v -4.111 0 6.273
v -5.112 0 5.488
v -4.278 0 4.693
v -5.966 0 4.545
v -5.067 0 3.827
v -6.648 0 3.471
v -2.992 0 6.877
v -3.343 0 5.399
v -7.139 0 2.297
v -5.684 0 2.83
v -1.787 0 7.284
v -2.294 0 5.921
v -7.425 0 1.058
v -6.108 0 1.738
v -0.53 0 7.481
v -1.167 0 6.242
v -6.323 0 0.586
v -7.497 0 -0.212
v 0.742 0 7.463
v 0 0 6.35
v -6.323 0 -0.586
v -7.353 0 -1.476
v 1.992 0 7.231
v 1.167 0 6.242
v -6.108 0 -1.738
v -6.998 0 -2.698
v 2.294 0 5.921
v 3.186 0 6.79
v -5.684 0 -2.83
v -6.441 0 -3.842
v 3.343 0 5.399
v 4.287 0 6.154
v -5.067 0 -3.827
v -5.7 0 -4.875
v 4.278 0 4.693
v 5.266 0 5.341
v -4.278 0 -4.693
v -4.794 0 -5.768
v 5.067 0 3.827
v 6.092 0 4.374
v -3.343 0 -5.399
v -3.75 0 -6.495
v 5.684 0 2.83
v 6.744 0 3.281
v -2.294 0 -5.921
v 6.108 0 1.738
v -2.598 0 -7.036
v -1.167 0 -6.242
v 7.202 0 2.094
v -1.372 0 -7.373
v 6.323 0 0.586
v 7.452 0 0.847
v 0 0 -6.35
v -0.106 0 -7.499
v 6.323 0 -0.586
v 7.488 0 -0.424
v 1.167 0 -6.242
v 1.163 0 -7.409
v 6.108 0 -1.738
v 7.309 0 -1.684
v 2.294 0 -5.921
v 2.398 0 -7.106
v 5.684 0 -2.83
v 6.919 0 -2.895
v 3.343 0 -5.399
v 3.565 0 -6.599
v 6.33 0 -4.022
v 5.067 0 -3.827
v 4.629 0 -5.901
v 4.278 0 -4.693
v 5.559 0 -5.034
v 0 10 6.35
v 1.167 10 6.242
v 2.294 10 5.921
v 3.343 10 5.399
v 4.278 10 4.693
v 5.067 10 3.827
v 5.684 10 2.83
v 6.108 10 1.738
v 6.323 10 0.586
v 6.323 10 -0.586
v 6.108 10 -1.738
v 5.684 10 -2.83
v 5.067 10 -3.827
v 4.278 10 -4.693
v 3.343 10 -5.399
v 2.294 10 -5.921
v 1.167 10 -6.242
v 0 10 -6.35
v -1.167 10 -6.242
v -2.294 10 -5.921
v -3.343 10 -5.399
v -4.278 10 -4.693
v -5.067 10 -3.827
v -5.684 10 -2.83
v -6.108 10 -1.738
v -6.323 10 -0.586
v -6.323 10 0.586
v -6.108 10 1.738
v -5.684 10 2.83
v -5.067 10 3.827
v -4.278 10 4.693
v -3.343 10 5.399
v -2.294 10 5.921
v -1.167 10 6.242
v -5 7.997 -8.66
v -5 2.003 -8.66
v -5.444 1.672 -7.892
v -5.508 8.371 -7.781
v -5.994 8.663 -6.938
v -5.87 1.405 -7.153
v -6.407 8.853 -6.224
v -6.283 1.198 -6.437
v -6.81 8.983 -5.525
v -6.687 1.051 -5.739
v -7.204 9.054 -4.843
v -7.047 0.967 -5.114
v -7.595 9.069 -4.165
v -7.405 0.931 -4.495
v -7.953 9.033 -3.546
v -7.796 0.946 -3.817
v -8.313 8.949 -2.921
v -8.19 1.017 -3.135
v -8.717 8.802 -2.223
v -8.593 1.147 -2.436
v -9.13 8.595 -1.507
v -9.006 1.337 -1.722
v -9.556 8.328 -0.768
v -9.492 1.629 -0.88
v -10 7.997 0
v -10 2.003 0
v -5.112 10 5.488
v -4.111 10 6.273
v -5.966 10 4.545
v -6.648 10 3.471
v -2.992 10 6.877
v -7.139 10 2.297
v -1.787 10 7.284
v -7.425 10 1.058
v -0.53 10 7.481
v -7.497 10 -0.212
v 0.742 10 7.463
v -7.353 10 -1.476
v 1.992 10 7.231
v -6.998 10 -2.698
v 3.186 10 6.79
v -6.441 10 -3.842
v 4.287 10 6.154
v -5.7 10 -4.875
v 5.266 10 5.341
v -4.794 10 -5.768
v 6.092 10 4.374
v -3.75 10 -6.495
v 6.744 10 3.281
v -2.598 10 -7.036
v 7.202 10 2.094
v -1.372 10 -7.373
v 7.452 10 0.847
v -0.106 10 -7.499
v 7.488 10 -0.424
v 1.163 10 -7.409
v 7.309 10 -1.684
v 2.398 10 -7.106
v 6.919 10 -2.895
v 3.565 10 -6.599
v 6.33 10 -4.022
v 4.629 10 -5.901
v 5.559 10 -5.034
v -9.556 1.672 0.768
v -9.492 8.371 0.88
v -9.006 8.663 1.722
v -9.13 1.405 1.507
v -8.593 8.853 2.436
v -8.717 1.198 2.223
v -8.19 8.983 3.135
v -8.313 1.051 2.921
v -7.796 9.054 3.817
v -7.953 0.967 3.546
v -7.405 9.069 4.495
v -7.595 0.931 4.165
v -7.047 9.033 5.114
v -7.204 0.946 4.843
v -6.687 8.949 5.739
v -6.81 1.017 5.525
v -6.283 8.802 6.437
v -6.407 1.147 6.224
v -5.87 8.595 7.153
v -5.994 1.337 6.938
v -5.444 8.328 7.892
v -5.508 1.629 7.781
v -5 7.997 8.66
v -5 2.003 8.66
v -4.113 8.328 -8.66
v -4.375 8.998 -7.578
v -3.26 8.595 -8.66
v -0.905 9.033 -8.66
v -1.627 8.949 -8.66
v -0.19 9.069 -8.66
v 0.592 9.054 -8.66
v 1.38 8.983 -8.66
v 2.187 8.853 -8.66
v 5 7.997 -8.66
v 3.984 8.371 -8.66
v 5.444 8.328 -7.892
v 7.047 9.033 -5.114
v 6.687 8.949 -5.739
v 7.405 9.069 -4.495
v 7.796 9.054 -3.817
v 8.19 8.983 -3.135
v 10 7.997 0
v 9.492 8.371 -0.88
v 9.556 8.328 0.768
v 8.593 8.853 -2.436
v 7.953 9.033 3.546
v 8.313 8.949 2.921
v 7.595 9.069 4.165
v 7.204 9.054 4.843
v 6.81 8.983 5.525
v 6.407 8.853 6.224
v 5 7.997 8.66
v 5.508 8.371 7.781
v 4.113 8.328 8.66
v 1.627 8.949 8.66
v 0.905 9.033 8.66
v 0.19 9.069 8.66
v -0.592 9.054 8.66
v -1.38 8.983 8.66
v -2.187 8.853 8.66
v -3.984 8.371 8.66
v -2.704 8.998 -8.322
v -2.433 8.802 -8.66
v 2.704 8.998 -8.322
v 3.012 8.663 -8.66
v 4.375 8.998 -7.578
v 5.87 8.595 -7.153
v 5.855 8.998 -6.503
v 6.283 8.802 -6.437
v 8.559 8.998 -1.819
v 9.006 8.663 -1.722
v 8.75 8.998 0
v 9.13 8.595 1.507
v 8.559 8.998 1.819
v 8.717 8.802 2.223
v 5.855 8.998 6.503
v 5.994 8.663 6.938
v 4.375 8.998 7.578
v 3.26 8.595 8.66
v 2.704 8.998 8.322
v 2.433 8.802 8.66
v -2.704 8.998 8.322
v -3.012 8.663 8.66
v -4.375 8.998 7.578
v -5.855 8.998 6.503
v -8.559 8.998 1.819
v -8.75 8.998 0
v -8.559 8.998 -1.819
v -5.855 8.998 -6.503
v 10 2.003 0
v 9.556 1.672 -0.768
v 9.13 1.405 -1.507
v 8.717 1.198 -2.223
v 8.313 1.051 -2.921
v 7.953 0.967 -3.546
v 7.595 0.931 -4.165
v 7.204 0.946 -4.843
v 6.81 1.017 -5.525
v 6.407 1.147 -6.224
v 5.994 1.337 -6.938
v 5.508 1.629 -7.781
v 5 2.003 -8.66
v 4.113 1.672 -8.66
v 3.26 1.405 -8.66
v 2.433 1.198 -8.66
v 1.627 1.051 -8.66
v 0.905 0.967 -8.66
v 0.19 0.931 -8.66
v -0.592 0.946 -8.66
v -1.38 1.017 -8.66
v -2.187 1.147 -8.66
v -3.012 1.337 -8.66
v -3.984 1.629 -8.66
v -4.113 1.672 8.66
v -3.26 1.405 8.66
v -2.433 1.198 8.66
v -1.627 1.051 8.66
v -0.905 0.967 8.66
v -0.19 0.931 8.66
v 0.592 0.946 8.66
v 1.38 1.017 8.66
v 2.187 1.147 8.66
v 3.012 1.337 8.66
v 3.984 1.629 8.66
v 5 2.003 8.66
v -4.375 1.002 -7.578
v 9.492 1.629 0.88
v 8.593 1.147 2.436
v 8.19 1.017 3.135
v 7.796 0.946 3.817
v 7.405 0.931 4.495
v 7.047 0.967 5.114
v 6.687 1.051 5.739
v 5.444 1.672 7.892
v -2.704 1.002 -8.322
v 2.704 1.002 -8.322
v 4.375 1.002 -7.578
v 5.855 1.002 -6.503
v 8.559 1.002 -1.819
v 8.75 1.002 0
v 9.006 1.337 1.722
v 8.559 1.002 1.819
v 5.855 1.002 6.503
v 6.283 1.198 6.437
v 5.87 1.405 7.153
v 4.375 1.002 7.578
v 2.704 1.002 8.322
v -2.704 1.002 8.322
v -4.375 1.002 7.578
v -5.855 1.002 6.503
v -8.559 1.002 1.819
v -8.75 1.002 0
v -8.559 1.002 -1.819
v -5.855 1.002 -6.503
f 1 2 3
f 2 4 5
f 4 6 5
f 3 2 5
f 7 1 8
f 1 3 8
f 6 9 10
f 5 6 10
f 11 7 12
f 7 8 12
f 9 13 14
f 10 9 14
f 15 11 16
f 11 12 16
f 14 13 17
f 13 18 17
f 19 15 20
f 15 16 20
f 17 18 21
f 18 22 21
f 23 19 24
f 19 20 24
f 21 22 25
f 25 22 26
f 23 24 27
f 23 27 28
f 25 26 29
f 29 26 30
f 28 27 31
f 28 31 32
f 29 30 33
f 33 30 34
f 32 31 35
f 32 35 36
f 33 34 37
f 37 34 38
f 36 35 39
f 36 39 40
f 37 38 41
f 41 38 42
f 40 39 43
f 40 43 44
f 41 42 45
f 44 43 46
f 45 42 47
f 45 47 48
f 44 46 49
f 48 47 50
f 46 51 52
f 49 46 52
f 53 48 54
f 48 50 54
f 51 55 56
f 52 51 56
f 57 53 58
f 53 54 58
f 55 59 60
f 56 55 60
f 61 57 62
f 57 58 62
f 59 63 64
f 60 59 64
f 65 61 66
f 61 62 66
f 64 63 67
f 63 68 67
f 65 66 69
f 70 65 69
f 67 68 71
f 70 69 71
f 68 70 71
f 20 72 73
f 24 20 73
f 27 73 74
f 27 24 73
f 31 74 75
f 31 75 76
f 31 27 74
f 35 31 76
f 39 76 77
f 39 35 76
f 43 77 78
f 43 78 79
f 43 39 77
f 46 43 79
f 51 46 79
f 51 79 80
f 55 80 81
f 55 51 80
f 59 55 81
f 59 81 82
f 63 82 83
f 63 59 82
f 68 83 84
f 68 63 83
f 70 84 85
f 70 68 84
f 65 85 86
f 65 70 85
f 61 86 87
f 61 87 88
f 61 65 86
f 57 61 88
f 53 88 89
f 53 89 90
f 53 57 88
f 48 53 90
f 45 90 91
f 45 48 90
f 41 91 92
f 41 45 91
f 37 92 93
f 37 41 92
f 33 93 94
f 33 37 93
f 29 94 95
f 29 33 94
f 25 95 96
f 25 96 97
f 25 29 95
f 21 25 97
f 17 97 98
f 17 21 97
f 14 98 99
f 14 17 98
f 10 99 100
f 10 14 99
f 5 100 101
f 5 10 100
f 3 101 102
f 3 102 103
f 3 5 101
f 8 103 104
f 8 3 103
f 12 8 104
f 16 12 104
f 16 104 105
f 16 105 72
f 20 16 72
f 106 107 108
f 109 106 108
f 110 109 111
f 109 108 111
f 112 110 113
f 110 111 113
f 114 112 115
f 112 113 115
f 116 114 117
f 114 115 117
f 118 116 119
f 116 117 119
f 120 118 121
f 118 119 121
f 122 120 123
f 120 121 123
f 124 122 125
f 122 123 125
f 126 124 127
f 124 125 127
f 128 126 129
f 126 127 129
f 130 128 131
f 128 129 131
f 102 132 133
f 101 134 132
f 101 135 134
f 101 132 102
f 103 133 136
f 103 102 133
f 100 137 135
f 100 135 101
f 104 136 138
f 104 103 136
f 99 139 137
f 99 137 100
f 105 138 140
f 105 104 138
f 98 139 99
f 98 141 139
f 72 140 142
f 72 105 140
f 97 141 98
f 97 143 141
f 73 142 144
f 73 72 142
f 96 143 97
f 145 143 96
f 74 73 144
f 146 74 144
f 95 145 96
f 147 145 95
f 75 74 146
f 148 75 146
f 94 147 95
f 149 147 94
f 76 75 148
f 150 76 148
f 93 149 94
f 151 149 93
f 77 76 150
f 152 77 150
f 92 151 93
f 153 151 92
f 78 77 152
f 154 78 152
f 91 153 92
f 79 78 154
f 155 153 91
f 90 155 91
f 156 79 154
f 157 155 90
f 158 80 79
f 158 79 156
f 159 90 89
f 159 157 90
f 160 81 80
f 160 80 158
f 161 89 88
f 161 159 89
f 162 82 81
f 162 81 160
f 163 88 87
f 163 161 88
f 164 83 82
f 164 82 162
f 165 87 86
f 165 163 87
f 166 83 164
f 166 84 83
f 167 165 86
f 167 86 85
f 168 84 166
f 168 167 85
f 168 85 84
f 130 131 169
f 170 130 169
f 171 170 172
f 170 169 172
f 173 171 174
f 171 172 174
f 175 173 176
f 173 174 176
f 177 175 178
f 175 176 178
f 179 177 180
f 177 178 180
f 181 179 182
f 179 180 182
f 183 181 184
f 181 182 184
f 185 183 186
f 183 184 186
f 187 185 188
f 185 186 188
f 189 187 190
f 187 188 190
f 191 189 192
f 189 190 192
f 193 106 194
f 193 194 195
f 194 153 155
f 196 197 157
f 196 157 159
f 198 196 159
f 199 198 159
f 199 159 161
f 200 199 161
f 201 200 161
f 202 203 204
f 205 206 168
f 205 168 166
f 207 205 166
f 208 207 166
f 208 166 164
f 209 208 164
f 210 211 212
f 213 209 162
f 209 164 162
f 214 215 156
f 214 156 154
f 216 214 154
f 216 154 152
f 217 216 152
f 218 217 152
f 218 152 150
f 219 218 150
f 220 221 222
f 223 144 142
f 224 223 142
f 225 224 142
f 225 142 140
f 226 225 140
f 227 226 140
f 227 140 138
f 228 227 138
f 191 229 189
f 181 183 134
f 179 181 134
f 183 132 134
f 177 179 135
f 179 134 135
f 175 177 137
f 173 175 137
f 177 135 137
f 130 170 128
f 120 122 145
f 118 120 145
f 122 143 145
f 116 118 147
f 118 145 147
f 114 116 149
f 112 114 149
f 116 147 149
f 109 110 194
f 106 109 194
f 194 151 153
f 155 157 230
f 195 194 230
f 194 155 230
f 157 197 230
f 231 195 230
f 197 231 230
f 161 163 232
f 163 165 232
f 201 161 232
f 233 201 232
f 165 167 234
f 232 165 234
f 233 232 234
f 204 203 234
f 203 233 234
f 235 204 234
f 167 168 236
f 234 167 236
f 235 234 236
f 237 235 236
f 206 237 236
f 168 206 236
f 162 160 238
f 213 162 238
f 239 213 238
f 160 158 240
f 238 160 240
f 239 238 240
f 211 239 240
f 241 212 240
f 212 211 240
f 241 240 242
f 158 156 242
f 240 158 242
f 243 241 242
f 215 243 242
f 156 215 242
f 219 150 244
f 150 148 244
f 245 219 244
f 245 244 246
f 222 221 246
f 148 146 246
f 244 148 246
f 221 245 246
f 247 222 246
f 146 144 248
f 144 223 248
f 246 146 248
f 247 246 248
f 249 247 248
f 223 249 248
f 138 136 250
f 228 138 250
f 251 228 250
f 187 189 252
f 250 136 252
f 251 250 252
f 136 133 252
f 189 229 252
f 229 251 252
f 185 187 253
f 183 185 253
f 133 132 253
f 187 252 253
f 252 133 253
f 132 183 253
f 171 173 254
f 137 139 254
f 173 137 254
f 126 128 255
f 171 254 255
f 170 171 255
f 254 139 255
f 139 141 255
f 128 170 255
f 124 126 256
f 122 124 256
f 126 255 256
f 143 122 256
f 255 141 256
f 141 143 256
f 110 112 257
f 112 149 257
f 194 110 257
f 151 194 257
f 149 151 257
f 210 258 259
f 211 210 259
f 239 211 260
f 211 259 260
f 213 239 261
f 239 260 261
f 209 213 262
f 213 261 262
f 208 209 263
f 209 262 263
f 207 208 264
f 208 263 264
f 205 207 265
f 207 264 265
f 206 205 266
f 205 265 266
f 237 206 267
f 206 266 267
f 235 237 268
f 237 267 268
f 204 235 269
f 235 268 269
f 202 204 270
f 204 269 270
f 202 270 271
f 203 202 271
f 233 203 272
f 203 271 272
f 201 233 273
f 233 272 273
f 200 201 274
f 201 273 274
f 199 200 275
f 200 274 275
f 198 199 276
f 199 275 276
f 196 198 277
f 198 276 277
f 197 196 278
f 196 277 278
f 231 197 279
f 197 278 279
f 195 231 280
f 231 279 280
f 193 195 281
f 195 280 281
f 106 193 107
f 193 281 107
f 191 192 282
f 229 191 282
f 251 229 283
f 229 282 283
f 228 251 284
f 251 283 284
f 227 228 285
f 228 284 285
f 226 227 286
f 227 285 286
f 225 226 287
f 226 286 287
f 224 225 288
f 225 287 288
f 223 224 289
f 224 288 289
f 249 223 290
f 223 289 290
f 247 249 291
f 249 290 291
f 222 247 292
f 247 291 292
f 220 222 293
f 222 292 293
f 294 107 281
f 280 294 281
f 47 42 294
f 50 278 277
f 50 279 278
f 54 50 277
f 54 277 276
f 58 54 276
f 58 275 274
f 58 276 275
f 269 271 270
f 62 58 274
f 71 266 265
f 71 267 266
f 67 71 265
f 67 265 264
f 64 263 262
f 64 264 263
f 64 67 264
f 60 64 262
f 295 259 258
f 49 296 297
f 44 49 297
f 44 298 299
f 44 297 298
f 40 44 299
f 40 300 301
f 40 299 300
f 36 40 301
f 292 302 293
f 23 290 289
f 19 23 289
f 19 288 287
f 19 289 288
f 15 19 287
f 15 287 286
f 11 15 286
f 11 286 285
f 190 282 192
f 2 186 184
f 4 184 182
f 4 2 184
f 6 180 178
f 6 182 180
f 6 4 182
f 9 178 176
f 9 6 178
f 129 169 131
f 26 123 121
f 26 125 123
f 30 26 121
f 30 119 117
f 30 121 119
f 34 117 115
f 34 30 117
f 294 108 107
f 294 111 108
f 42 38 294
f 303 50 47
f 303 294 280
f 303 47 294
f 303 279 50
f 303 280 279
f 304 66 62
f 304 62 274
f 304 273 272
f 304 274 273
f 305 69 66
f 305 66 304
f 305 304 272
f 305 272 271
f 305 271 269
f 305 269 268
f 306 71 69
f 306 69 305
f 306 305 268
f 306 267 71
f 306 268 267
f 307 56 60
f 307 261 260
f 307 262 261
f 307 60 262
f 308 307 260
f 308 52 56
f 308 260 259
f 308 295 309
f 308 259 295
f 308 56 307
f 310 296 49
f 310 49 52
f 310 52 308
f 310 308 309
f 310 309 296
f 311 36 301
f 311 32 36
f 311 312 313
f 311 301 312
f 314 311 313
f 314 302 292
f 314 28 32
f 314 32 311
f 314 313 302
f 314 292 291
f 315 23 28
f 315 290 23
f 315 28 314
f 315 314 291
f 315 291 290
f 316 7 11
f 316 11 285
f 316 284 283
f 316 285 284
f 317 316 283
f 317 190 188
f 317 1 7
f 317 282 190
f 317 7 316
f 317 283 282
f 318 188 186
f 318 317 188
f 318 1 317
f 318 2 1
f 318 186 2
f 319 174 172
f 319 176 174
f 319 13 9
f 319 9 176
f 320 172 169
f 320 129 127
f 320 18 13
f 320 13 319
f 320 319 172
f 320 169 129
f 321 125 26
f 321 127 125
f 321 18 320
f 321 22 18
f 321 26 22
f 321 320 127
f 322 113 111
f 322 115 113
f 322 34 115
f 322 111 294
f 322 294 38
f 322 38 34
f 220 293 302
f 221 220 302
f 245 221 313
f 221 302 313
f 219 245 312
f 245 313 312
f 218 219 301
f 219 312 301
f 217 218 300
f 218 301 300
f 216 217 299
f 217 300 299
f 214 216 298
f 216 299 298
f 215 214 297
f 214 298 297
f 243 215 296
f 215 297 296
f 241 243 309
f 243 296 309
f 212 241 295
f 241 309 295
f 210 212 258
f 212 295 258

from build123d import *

# Parameters (mm, degrees)
SKETCH1_R           = 6.35
BOSS_EXTRUDE1_DEPTH = 10


with BuildPart() as part:
    # Sketch1 → Boss-Extrude1 (new body)
    with BuildSketch(Plane(origin=(0, 0, 0), x_dir=(1, 0, 0), z_dir=(0, 1, 0))):
        Polygon((10, 0), (5, 8.660254038), (-5, 8.660254038), (-10, 0), (-5, -8.660254038), (5, -8.660254038), align=None)
        with Locations(Location((0, 0, 0), (0, 0, 270))):
            Circle(SKETCH1_R, mode=Mode.SUBTRACT)
    extrude(amount=BOSS_EXTRUDE1_DEPTH)

    # Sketch3 → Cut-Revolve1 (revolve, cut)
    with BuildSketch(Plane.XY, mode=Mode.PRIVATE) as cut_revolve1_sk:
        Polygon((-10, 10), (-10, 7.996913118), (-7.5, 10), align=None)
    cut_revolve1 = revolve(cut_revolve1_sk.sketch.rotate(Axis((0, 10, 0), (0, -1, 0)), 60.000000094), axis=Axis((0, 10, 0), (0, -1, 0)), mode=Mode.SUBTRACT)

    # Mirror1: Cut-Revolve1 across plane
    add(cut_revolve1.mirror(Plane(origin=(0, 5, 0), x_dir=(0, 0, 1), z_dir=(0, -1, 0))), mode=Mode.SUBTRACT)


solid = part.part
